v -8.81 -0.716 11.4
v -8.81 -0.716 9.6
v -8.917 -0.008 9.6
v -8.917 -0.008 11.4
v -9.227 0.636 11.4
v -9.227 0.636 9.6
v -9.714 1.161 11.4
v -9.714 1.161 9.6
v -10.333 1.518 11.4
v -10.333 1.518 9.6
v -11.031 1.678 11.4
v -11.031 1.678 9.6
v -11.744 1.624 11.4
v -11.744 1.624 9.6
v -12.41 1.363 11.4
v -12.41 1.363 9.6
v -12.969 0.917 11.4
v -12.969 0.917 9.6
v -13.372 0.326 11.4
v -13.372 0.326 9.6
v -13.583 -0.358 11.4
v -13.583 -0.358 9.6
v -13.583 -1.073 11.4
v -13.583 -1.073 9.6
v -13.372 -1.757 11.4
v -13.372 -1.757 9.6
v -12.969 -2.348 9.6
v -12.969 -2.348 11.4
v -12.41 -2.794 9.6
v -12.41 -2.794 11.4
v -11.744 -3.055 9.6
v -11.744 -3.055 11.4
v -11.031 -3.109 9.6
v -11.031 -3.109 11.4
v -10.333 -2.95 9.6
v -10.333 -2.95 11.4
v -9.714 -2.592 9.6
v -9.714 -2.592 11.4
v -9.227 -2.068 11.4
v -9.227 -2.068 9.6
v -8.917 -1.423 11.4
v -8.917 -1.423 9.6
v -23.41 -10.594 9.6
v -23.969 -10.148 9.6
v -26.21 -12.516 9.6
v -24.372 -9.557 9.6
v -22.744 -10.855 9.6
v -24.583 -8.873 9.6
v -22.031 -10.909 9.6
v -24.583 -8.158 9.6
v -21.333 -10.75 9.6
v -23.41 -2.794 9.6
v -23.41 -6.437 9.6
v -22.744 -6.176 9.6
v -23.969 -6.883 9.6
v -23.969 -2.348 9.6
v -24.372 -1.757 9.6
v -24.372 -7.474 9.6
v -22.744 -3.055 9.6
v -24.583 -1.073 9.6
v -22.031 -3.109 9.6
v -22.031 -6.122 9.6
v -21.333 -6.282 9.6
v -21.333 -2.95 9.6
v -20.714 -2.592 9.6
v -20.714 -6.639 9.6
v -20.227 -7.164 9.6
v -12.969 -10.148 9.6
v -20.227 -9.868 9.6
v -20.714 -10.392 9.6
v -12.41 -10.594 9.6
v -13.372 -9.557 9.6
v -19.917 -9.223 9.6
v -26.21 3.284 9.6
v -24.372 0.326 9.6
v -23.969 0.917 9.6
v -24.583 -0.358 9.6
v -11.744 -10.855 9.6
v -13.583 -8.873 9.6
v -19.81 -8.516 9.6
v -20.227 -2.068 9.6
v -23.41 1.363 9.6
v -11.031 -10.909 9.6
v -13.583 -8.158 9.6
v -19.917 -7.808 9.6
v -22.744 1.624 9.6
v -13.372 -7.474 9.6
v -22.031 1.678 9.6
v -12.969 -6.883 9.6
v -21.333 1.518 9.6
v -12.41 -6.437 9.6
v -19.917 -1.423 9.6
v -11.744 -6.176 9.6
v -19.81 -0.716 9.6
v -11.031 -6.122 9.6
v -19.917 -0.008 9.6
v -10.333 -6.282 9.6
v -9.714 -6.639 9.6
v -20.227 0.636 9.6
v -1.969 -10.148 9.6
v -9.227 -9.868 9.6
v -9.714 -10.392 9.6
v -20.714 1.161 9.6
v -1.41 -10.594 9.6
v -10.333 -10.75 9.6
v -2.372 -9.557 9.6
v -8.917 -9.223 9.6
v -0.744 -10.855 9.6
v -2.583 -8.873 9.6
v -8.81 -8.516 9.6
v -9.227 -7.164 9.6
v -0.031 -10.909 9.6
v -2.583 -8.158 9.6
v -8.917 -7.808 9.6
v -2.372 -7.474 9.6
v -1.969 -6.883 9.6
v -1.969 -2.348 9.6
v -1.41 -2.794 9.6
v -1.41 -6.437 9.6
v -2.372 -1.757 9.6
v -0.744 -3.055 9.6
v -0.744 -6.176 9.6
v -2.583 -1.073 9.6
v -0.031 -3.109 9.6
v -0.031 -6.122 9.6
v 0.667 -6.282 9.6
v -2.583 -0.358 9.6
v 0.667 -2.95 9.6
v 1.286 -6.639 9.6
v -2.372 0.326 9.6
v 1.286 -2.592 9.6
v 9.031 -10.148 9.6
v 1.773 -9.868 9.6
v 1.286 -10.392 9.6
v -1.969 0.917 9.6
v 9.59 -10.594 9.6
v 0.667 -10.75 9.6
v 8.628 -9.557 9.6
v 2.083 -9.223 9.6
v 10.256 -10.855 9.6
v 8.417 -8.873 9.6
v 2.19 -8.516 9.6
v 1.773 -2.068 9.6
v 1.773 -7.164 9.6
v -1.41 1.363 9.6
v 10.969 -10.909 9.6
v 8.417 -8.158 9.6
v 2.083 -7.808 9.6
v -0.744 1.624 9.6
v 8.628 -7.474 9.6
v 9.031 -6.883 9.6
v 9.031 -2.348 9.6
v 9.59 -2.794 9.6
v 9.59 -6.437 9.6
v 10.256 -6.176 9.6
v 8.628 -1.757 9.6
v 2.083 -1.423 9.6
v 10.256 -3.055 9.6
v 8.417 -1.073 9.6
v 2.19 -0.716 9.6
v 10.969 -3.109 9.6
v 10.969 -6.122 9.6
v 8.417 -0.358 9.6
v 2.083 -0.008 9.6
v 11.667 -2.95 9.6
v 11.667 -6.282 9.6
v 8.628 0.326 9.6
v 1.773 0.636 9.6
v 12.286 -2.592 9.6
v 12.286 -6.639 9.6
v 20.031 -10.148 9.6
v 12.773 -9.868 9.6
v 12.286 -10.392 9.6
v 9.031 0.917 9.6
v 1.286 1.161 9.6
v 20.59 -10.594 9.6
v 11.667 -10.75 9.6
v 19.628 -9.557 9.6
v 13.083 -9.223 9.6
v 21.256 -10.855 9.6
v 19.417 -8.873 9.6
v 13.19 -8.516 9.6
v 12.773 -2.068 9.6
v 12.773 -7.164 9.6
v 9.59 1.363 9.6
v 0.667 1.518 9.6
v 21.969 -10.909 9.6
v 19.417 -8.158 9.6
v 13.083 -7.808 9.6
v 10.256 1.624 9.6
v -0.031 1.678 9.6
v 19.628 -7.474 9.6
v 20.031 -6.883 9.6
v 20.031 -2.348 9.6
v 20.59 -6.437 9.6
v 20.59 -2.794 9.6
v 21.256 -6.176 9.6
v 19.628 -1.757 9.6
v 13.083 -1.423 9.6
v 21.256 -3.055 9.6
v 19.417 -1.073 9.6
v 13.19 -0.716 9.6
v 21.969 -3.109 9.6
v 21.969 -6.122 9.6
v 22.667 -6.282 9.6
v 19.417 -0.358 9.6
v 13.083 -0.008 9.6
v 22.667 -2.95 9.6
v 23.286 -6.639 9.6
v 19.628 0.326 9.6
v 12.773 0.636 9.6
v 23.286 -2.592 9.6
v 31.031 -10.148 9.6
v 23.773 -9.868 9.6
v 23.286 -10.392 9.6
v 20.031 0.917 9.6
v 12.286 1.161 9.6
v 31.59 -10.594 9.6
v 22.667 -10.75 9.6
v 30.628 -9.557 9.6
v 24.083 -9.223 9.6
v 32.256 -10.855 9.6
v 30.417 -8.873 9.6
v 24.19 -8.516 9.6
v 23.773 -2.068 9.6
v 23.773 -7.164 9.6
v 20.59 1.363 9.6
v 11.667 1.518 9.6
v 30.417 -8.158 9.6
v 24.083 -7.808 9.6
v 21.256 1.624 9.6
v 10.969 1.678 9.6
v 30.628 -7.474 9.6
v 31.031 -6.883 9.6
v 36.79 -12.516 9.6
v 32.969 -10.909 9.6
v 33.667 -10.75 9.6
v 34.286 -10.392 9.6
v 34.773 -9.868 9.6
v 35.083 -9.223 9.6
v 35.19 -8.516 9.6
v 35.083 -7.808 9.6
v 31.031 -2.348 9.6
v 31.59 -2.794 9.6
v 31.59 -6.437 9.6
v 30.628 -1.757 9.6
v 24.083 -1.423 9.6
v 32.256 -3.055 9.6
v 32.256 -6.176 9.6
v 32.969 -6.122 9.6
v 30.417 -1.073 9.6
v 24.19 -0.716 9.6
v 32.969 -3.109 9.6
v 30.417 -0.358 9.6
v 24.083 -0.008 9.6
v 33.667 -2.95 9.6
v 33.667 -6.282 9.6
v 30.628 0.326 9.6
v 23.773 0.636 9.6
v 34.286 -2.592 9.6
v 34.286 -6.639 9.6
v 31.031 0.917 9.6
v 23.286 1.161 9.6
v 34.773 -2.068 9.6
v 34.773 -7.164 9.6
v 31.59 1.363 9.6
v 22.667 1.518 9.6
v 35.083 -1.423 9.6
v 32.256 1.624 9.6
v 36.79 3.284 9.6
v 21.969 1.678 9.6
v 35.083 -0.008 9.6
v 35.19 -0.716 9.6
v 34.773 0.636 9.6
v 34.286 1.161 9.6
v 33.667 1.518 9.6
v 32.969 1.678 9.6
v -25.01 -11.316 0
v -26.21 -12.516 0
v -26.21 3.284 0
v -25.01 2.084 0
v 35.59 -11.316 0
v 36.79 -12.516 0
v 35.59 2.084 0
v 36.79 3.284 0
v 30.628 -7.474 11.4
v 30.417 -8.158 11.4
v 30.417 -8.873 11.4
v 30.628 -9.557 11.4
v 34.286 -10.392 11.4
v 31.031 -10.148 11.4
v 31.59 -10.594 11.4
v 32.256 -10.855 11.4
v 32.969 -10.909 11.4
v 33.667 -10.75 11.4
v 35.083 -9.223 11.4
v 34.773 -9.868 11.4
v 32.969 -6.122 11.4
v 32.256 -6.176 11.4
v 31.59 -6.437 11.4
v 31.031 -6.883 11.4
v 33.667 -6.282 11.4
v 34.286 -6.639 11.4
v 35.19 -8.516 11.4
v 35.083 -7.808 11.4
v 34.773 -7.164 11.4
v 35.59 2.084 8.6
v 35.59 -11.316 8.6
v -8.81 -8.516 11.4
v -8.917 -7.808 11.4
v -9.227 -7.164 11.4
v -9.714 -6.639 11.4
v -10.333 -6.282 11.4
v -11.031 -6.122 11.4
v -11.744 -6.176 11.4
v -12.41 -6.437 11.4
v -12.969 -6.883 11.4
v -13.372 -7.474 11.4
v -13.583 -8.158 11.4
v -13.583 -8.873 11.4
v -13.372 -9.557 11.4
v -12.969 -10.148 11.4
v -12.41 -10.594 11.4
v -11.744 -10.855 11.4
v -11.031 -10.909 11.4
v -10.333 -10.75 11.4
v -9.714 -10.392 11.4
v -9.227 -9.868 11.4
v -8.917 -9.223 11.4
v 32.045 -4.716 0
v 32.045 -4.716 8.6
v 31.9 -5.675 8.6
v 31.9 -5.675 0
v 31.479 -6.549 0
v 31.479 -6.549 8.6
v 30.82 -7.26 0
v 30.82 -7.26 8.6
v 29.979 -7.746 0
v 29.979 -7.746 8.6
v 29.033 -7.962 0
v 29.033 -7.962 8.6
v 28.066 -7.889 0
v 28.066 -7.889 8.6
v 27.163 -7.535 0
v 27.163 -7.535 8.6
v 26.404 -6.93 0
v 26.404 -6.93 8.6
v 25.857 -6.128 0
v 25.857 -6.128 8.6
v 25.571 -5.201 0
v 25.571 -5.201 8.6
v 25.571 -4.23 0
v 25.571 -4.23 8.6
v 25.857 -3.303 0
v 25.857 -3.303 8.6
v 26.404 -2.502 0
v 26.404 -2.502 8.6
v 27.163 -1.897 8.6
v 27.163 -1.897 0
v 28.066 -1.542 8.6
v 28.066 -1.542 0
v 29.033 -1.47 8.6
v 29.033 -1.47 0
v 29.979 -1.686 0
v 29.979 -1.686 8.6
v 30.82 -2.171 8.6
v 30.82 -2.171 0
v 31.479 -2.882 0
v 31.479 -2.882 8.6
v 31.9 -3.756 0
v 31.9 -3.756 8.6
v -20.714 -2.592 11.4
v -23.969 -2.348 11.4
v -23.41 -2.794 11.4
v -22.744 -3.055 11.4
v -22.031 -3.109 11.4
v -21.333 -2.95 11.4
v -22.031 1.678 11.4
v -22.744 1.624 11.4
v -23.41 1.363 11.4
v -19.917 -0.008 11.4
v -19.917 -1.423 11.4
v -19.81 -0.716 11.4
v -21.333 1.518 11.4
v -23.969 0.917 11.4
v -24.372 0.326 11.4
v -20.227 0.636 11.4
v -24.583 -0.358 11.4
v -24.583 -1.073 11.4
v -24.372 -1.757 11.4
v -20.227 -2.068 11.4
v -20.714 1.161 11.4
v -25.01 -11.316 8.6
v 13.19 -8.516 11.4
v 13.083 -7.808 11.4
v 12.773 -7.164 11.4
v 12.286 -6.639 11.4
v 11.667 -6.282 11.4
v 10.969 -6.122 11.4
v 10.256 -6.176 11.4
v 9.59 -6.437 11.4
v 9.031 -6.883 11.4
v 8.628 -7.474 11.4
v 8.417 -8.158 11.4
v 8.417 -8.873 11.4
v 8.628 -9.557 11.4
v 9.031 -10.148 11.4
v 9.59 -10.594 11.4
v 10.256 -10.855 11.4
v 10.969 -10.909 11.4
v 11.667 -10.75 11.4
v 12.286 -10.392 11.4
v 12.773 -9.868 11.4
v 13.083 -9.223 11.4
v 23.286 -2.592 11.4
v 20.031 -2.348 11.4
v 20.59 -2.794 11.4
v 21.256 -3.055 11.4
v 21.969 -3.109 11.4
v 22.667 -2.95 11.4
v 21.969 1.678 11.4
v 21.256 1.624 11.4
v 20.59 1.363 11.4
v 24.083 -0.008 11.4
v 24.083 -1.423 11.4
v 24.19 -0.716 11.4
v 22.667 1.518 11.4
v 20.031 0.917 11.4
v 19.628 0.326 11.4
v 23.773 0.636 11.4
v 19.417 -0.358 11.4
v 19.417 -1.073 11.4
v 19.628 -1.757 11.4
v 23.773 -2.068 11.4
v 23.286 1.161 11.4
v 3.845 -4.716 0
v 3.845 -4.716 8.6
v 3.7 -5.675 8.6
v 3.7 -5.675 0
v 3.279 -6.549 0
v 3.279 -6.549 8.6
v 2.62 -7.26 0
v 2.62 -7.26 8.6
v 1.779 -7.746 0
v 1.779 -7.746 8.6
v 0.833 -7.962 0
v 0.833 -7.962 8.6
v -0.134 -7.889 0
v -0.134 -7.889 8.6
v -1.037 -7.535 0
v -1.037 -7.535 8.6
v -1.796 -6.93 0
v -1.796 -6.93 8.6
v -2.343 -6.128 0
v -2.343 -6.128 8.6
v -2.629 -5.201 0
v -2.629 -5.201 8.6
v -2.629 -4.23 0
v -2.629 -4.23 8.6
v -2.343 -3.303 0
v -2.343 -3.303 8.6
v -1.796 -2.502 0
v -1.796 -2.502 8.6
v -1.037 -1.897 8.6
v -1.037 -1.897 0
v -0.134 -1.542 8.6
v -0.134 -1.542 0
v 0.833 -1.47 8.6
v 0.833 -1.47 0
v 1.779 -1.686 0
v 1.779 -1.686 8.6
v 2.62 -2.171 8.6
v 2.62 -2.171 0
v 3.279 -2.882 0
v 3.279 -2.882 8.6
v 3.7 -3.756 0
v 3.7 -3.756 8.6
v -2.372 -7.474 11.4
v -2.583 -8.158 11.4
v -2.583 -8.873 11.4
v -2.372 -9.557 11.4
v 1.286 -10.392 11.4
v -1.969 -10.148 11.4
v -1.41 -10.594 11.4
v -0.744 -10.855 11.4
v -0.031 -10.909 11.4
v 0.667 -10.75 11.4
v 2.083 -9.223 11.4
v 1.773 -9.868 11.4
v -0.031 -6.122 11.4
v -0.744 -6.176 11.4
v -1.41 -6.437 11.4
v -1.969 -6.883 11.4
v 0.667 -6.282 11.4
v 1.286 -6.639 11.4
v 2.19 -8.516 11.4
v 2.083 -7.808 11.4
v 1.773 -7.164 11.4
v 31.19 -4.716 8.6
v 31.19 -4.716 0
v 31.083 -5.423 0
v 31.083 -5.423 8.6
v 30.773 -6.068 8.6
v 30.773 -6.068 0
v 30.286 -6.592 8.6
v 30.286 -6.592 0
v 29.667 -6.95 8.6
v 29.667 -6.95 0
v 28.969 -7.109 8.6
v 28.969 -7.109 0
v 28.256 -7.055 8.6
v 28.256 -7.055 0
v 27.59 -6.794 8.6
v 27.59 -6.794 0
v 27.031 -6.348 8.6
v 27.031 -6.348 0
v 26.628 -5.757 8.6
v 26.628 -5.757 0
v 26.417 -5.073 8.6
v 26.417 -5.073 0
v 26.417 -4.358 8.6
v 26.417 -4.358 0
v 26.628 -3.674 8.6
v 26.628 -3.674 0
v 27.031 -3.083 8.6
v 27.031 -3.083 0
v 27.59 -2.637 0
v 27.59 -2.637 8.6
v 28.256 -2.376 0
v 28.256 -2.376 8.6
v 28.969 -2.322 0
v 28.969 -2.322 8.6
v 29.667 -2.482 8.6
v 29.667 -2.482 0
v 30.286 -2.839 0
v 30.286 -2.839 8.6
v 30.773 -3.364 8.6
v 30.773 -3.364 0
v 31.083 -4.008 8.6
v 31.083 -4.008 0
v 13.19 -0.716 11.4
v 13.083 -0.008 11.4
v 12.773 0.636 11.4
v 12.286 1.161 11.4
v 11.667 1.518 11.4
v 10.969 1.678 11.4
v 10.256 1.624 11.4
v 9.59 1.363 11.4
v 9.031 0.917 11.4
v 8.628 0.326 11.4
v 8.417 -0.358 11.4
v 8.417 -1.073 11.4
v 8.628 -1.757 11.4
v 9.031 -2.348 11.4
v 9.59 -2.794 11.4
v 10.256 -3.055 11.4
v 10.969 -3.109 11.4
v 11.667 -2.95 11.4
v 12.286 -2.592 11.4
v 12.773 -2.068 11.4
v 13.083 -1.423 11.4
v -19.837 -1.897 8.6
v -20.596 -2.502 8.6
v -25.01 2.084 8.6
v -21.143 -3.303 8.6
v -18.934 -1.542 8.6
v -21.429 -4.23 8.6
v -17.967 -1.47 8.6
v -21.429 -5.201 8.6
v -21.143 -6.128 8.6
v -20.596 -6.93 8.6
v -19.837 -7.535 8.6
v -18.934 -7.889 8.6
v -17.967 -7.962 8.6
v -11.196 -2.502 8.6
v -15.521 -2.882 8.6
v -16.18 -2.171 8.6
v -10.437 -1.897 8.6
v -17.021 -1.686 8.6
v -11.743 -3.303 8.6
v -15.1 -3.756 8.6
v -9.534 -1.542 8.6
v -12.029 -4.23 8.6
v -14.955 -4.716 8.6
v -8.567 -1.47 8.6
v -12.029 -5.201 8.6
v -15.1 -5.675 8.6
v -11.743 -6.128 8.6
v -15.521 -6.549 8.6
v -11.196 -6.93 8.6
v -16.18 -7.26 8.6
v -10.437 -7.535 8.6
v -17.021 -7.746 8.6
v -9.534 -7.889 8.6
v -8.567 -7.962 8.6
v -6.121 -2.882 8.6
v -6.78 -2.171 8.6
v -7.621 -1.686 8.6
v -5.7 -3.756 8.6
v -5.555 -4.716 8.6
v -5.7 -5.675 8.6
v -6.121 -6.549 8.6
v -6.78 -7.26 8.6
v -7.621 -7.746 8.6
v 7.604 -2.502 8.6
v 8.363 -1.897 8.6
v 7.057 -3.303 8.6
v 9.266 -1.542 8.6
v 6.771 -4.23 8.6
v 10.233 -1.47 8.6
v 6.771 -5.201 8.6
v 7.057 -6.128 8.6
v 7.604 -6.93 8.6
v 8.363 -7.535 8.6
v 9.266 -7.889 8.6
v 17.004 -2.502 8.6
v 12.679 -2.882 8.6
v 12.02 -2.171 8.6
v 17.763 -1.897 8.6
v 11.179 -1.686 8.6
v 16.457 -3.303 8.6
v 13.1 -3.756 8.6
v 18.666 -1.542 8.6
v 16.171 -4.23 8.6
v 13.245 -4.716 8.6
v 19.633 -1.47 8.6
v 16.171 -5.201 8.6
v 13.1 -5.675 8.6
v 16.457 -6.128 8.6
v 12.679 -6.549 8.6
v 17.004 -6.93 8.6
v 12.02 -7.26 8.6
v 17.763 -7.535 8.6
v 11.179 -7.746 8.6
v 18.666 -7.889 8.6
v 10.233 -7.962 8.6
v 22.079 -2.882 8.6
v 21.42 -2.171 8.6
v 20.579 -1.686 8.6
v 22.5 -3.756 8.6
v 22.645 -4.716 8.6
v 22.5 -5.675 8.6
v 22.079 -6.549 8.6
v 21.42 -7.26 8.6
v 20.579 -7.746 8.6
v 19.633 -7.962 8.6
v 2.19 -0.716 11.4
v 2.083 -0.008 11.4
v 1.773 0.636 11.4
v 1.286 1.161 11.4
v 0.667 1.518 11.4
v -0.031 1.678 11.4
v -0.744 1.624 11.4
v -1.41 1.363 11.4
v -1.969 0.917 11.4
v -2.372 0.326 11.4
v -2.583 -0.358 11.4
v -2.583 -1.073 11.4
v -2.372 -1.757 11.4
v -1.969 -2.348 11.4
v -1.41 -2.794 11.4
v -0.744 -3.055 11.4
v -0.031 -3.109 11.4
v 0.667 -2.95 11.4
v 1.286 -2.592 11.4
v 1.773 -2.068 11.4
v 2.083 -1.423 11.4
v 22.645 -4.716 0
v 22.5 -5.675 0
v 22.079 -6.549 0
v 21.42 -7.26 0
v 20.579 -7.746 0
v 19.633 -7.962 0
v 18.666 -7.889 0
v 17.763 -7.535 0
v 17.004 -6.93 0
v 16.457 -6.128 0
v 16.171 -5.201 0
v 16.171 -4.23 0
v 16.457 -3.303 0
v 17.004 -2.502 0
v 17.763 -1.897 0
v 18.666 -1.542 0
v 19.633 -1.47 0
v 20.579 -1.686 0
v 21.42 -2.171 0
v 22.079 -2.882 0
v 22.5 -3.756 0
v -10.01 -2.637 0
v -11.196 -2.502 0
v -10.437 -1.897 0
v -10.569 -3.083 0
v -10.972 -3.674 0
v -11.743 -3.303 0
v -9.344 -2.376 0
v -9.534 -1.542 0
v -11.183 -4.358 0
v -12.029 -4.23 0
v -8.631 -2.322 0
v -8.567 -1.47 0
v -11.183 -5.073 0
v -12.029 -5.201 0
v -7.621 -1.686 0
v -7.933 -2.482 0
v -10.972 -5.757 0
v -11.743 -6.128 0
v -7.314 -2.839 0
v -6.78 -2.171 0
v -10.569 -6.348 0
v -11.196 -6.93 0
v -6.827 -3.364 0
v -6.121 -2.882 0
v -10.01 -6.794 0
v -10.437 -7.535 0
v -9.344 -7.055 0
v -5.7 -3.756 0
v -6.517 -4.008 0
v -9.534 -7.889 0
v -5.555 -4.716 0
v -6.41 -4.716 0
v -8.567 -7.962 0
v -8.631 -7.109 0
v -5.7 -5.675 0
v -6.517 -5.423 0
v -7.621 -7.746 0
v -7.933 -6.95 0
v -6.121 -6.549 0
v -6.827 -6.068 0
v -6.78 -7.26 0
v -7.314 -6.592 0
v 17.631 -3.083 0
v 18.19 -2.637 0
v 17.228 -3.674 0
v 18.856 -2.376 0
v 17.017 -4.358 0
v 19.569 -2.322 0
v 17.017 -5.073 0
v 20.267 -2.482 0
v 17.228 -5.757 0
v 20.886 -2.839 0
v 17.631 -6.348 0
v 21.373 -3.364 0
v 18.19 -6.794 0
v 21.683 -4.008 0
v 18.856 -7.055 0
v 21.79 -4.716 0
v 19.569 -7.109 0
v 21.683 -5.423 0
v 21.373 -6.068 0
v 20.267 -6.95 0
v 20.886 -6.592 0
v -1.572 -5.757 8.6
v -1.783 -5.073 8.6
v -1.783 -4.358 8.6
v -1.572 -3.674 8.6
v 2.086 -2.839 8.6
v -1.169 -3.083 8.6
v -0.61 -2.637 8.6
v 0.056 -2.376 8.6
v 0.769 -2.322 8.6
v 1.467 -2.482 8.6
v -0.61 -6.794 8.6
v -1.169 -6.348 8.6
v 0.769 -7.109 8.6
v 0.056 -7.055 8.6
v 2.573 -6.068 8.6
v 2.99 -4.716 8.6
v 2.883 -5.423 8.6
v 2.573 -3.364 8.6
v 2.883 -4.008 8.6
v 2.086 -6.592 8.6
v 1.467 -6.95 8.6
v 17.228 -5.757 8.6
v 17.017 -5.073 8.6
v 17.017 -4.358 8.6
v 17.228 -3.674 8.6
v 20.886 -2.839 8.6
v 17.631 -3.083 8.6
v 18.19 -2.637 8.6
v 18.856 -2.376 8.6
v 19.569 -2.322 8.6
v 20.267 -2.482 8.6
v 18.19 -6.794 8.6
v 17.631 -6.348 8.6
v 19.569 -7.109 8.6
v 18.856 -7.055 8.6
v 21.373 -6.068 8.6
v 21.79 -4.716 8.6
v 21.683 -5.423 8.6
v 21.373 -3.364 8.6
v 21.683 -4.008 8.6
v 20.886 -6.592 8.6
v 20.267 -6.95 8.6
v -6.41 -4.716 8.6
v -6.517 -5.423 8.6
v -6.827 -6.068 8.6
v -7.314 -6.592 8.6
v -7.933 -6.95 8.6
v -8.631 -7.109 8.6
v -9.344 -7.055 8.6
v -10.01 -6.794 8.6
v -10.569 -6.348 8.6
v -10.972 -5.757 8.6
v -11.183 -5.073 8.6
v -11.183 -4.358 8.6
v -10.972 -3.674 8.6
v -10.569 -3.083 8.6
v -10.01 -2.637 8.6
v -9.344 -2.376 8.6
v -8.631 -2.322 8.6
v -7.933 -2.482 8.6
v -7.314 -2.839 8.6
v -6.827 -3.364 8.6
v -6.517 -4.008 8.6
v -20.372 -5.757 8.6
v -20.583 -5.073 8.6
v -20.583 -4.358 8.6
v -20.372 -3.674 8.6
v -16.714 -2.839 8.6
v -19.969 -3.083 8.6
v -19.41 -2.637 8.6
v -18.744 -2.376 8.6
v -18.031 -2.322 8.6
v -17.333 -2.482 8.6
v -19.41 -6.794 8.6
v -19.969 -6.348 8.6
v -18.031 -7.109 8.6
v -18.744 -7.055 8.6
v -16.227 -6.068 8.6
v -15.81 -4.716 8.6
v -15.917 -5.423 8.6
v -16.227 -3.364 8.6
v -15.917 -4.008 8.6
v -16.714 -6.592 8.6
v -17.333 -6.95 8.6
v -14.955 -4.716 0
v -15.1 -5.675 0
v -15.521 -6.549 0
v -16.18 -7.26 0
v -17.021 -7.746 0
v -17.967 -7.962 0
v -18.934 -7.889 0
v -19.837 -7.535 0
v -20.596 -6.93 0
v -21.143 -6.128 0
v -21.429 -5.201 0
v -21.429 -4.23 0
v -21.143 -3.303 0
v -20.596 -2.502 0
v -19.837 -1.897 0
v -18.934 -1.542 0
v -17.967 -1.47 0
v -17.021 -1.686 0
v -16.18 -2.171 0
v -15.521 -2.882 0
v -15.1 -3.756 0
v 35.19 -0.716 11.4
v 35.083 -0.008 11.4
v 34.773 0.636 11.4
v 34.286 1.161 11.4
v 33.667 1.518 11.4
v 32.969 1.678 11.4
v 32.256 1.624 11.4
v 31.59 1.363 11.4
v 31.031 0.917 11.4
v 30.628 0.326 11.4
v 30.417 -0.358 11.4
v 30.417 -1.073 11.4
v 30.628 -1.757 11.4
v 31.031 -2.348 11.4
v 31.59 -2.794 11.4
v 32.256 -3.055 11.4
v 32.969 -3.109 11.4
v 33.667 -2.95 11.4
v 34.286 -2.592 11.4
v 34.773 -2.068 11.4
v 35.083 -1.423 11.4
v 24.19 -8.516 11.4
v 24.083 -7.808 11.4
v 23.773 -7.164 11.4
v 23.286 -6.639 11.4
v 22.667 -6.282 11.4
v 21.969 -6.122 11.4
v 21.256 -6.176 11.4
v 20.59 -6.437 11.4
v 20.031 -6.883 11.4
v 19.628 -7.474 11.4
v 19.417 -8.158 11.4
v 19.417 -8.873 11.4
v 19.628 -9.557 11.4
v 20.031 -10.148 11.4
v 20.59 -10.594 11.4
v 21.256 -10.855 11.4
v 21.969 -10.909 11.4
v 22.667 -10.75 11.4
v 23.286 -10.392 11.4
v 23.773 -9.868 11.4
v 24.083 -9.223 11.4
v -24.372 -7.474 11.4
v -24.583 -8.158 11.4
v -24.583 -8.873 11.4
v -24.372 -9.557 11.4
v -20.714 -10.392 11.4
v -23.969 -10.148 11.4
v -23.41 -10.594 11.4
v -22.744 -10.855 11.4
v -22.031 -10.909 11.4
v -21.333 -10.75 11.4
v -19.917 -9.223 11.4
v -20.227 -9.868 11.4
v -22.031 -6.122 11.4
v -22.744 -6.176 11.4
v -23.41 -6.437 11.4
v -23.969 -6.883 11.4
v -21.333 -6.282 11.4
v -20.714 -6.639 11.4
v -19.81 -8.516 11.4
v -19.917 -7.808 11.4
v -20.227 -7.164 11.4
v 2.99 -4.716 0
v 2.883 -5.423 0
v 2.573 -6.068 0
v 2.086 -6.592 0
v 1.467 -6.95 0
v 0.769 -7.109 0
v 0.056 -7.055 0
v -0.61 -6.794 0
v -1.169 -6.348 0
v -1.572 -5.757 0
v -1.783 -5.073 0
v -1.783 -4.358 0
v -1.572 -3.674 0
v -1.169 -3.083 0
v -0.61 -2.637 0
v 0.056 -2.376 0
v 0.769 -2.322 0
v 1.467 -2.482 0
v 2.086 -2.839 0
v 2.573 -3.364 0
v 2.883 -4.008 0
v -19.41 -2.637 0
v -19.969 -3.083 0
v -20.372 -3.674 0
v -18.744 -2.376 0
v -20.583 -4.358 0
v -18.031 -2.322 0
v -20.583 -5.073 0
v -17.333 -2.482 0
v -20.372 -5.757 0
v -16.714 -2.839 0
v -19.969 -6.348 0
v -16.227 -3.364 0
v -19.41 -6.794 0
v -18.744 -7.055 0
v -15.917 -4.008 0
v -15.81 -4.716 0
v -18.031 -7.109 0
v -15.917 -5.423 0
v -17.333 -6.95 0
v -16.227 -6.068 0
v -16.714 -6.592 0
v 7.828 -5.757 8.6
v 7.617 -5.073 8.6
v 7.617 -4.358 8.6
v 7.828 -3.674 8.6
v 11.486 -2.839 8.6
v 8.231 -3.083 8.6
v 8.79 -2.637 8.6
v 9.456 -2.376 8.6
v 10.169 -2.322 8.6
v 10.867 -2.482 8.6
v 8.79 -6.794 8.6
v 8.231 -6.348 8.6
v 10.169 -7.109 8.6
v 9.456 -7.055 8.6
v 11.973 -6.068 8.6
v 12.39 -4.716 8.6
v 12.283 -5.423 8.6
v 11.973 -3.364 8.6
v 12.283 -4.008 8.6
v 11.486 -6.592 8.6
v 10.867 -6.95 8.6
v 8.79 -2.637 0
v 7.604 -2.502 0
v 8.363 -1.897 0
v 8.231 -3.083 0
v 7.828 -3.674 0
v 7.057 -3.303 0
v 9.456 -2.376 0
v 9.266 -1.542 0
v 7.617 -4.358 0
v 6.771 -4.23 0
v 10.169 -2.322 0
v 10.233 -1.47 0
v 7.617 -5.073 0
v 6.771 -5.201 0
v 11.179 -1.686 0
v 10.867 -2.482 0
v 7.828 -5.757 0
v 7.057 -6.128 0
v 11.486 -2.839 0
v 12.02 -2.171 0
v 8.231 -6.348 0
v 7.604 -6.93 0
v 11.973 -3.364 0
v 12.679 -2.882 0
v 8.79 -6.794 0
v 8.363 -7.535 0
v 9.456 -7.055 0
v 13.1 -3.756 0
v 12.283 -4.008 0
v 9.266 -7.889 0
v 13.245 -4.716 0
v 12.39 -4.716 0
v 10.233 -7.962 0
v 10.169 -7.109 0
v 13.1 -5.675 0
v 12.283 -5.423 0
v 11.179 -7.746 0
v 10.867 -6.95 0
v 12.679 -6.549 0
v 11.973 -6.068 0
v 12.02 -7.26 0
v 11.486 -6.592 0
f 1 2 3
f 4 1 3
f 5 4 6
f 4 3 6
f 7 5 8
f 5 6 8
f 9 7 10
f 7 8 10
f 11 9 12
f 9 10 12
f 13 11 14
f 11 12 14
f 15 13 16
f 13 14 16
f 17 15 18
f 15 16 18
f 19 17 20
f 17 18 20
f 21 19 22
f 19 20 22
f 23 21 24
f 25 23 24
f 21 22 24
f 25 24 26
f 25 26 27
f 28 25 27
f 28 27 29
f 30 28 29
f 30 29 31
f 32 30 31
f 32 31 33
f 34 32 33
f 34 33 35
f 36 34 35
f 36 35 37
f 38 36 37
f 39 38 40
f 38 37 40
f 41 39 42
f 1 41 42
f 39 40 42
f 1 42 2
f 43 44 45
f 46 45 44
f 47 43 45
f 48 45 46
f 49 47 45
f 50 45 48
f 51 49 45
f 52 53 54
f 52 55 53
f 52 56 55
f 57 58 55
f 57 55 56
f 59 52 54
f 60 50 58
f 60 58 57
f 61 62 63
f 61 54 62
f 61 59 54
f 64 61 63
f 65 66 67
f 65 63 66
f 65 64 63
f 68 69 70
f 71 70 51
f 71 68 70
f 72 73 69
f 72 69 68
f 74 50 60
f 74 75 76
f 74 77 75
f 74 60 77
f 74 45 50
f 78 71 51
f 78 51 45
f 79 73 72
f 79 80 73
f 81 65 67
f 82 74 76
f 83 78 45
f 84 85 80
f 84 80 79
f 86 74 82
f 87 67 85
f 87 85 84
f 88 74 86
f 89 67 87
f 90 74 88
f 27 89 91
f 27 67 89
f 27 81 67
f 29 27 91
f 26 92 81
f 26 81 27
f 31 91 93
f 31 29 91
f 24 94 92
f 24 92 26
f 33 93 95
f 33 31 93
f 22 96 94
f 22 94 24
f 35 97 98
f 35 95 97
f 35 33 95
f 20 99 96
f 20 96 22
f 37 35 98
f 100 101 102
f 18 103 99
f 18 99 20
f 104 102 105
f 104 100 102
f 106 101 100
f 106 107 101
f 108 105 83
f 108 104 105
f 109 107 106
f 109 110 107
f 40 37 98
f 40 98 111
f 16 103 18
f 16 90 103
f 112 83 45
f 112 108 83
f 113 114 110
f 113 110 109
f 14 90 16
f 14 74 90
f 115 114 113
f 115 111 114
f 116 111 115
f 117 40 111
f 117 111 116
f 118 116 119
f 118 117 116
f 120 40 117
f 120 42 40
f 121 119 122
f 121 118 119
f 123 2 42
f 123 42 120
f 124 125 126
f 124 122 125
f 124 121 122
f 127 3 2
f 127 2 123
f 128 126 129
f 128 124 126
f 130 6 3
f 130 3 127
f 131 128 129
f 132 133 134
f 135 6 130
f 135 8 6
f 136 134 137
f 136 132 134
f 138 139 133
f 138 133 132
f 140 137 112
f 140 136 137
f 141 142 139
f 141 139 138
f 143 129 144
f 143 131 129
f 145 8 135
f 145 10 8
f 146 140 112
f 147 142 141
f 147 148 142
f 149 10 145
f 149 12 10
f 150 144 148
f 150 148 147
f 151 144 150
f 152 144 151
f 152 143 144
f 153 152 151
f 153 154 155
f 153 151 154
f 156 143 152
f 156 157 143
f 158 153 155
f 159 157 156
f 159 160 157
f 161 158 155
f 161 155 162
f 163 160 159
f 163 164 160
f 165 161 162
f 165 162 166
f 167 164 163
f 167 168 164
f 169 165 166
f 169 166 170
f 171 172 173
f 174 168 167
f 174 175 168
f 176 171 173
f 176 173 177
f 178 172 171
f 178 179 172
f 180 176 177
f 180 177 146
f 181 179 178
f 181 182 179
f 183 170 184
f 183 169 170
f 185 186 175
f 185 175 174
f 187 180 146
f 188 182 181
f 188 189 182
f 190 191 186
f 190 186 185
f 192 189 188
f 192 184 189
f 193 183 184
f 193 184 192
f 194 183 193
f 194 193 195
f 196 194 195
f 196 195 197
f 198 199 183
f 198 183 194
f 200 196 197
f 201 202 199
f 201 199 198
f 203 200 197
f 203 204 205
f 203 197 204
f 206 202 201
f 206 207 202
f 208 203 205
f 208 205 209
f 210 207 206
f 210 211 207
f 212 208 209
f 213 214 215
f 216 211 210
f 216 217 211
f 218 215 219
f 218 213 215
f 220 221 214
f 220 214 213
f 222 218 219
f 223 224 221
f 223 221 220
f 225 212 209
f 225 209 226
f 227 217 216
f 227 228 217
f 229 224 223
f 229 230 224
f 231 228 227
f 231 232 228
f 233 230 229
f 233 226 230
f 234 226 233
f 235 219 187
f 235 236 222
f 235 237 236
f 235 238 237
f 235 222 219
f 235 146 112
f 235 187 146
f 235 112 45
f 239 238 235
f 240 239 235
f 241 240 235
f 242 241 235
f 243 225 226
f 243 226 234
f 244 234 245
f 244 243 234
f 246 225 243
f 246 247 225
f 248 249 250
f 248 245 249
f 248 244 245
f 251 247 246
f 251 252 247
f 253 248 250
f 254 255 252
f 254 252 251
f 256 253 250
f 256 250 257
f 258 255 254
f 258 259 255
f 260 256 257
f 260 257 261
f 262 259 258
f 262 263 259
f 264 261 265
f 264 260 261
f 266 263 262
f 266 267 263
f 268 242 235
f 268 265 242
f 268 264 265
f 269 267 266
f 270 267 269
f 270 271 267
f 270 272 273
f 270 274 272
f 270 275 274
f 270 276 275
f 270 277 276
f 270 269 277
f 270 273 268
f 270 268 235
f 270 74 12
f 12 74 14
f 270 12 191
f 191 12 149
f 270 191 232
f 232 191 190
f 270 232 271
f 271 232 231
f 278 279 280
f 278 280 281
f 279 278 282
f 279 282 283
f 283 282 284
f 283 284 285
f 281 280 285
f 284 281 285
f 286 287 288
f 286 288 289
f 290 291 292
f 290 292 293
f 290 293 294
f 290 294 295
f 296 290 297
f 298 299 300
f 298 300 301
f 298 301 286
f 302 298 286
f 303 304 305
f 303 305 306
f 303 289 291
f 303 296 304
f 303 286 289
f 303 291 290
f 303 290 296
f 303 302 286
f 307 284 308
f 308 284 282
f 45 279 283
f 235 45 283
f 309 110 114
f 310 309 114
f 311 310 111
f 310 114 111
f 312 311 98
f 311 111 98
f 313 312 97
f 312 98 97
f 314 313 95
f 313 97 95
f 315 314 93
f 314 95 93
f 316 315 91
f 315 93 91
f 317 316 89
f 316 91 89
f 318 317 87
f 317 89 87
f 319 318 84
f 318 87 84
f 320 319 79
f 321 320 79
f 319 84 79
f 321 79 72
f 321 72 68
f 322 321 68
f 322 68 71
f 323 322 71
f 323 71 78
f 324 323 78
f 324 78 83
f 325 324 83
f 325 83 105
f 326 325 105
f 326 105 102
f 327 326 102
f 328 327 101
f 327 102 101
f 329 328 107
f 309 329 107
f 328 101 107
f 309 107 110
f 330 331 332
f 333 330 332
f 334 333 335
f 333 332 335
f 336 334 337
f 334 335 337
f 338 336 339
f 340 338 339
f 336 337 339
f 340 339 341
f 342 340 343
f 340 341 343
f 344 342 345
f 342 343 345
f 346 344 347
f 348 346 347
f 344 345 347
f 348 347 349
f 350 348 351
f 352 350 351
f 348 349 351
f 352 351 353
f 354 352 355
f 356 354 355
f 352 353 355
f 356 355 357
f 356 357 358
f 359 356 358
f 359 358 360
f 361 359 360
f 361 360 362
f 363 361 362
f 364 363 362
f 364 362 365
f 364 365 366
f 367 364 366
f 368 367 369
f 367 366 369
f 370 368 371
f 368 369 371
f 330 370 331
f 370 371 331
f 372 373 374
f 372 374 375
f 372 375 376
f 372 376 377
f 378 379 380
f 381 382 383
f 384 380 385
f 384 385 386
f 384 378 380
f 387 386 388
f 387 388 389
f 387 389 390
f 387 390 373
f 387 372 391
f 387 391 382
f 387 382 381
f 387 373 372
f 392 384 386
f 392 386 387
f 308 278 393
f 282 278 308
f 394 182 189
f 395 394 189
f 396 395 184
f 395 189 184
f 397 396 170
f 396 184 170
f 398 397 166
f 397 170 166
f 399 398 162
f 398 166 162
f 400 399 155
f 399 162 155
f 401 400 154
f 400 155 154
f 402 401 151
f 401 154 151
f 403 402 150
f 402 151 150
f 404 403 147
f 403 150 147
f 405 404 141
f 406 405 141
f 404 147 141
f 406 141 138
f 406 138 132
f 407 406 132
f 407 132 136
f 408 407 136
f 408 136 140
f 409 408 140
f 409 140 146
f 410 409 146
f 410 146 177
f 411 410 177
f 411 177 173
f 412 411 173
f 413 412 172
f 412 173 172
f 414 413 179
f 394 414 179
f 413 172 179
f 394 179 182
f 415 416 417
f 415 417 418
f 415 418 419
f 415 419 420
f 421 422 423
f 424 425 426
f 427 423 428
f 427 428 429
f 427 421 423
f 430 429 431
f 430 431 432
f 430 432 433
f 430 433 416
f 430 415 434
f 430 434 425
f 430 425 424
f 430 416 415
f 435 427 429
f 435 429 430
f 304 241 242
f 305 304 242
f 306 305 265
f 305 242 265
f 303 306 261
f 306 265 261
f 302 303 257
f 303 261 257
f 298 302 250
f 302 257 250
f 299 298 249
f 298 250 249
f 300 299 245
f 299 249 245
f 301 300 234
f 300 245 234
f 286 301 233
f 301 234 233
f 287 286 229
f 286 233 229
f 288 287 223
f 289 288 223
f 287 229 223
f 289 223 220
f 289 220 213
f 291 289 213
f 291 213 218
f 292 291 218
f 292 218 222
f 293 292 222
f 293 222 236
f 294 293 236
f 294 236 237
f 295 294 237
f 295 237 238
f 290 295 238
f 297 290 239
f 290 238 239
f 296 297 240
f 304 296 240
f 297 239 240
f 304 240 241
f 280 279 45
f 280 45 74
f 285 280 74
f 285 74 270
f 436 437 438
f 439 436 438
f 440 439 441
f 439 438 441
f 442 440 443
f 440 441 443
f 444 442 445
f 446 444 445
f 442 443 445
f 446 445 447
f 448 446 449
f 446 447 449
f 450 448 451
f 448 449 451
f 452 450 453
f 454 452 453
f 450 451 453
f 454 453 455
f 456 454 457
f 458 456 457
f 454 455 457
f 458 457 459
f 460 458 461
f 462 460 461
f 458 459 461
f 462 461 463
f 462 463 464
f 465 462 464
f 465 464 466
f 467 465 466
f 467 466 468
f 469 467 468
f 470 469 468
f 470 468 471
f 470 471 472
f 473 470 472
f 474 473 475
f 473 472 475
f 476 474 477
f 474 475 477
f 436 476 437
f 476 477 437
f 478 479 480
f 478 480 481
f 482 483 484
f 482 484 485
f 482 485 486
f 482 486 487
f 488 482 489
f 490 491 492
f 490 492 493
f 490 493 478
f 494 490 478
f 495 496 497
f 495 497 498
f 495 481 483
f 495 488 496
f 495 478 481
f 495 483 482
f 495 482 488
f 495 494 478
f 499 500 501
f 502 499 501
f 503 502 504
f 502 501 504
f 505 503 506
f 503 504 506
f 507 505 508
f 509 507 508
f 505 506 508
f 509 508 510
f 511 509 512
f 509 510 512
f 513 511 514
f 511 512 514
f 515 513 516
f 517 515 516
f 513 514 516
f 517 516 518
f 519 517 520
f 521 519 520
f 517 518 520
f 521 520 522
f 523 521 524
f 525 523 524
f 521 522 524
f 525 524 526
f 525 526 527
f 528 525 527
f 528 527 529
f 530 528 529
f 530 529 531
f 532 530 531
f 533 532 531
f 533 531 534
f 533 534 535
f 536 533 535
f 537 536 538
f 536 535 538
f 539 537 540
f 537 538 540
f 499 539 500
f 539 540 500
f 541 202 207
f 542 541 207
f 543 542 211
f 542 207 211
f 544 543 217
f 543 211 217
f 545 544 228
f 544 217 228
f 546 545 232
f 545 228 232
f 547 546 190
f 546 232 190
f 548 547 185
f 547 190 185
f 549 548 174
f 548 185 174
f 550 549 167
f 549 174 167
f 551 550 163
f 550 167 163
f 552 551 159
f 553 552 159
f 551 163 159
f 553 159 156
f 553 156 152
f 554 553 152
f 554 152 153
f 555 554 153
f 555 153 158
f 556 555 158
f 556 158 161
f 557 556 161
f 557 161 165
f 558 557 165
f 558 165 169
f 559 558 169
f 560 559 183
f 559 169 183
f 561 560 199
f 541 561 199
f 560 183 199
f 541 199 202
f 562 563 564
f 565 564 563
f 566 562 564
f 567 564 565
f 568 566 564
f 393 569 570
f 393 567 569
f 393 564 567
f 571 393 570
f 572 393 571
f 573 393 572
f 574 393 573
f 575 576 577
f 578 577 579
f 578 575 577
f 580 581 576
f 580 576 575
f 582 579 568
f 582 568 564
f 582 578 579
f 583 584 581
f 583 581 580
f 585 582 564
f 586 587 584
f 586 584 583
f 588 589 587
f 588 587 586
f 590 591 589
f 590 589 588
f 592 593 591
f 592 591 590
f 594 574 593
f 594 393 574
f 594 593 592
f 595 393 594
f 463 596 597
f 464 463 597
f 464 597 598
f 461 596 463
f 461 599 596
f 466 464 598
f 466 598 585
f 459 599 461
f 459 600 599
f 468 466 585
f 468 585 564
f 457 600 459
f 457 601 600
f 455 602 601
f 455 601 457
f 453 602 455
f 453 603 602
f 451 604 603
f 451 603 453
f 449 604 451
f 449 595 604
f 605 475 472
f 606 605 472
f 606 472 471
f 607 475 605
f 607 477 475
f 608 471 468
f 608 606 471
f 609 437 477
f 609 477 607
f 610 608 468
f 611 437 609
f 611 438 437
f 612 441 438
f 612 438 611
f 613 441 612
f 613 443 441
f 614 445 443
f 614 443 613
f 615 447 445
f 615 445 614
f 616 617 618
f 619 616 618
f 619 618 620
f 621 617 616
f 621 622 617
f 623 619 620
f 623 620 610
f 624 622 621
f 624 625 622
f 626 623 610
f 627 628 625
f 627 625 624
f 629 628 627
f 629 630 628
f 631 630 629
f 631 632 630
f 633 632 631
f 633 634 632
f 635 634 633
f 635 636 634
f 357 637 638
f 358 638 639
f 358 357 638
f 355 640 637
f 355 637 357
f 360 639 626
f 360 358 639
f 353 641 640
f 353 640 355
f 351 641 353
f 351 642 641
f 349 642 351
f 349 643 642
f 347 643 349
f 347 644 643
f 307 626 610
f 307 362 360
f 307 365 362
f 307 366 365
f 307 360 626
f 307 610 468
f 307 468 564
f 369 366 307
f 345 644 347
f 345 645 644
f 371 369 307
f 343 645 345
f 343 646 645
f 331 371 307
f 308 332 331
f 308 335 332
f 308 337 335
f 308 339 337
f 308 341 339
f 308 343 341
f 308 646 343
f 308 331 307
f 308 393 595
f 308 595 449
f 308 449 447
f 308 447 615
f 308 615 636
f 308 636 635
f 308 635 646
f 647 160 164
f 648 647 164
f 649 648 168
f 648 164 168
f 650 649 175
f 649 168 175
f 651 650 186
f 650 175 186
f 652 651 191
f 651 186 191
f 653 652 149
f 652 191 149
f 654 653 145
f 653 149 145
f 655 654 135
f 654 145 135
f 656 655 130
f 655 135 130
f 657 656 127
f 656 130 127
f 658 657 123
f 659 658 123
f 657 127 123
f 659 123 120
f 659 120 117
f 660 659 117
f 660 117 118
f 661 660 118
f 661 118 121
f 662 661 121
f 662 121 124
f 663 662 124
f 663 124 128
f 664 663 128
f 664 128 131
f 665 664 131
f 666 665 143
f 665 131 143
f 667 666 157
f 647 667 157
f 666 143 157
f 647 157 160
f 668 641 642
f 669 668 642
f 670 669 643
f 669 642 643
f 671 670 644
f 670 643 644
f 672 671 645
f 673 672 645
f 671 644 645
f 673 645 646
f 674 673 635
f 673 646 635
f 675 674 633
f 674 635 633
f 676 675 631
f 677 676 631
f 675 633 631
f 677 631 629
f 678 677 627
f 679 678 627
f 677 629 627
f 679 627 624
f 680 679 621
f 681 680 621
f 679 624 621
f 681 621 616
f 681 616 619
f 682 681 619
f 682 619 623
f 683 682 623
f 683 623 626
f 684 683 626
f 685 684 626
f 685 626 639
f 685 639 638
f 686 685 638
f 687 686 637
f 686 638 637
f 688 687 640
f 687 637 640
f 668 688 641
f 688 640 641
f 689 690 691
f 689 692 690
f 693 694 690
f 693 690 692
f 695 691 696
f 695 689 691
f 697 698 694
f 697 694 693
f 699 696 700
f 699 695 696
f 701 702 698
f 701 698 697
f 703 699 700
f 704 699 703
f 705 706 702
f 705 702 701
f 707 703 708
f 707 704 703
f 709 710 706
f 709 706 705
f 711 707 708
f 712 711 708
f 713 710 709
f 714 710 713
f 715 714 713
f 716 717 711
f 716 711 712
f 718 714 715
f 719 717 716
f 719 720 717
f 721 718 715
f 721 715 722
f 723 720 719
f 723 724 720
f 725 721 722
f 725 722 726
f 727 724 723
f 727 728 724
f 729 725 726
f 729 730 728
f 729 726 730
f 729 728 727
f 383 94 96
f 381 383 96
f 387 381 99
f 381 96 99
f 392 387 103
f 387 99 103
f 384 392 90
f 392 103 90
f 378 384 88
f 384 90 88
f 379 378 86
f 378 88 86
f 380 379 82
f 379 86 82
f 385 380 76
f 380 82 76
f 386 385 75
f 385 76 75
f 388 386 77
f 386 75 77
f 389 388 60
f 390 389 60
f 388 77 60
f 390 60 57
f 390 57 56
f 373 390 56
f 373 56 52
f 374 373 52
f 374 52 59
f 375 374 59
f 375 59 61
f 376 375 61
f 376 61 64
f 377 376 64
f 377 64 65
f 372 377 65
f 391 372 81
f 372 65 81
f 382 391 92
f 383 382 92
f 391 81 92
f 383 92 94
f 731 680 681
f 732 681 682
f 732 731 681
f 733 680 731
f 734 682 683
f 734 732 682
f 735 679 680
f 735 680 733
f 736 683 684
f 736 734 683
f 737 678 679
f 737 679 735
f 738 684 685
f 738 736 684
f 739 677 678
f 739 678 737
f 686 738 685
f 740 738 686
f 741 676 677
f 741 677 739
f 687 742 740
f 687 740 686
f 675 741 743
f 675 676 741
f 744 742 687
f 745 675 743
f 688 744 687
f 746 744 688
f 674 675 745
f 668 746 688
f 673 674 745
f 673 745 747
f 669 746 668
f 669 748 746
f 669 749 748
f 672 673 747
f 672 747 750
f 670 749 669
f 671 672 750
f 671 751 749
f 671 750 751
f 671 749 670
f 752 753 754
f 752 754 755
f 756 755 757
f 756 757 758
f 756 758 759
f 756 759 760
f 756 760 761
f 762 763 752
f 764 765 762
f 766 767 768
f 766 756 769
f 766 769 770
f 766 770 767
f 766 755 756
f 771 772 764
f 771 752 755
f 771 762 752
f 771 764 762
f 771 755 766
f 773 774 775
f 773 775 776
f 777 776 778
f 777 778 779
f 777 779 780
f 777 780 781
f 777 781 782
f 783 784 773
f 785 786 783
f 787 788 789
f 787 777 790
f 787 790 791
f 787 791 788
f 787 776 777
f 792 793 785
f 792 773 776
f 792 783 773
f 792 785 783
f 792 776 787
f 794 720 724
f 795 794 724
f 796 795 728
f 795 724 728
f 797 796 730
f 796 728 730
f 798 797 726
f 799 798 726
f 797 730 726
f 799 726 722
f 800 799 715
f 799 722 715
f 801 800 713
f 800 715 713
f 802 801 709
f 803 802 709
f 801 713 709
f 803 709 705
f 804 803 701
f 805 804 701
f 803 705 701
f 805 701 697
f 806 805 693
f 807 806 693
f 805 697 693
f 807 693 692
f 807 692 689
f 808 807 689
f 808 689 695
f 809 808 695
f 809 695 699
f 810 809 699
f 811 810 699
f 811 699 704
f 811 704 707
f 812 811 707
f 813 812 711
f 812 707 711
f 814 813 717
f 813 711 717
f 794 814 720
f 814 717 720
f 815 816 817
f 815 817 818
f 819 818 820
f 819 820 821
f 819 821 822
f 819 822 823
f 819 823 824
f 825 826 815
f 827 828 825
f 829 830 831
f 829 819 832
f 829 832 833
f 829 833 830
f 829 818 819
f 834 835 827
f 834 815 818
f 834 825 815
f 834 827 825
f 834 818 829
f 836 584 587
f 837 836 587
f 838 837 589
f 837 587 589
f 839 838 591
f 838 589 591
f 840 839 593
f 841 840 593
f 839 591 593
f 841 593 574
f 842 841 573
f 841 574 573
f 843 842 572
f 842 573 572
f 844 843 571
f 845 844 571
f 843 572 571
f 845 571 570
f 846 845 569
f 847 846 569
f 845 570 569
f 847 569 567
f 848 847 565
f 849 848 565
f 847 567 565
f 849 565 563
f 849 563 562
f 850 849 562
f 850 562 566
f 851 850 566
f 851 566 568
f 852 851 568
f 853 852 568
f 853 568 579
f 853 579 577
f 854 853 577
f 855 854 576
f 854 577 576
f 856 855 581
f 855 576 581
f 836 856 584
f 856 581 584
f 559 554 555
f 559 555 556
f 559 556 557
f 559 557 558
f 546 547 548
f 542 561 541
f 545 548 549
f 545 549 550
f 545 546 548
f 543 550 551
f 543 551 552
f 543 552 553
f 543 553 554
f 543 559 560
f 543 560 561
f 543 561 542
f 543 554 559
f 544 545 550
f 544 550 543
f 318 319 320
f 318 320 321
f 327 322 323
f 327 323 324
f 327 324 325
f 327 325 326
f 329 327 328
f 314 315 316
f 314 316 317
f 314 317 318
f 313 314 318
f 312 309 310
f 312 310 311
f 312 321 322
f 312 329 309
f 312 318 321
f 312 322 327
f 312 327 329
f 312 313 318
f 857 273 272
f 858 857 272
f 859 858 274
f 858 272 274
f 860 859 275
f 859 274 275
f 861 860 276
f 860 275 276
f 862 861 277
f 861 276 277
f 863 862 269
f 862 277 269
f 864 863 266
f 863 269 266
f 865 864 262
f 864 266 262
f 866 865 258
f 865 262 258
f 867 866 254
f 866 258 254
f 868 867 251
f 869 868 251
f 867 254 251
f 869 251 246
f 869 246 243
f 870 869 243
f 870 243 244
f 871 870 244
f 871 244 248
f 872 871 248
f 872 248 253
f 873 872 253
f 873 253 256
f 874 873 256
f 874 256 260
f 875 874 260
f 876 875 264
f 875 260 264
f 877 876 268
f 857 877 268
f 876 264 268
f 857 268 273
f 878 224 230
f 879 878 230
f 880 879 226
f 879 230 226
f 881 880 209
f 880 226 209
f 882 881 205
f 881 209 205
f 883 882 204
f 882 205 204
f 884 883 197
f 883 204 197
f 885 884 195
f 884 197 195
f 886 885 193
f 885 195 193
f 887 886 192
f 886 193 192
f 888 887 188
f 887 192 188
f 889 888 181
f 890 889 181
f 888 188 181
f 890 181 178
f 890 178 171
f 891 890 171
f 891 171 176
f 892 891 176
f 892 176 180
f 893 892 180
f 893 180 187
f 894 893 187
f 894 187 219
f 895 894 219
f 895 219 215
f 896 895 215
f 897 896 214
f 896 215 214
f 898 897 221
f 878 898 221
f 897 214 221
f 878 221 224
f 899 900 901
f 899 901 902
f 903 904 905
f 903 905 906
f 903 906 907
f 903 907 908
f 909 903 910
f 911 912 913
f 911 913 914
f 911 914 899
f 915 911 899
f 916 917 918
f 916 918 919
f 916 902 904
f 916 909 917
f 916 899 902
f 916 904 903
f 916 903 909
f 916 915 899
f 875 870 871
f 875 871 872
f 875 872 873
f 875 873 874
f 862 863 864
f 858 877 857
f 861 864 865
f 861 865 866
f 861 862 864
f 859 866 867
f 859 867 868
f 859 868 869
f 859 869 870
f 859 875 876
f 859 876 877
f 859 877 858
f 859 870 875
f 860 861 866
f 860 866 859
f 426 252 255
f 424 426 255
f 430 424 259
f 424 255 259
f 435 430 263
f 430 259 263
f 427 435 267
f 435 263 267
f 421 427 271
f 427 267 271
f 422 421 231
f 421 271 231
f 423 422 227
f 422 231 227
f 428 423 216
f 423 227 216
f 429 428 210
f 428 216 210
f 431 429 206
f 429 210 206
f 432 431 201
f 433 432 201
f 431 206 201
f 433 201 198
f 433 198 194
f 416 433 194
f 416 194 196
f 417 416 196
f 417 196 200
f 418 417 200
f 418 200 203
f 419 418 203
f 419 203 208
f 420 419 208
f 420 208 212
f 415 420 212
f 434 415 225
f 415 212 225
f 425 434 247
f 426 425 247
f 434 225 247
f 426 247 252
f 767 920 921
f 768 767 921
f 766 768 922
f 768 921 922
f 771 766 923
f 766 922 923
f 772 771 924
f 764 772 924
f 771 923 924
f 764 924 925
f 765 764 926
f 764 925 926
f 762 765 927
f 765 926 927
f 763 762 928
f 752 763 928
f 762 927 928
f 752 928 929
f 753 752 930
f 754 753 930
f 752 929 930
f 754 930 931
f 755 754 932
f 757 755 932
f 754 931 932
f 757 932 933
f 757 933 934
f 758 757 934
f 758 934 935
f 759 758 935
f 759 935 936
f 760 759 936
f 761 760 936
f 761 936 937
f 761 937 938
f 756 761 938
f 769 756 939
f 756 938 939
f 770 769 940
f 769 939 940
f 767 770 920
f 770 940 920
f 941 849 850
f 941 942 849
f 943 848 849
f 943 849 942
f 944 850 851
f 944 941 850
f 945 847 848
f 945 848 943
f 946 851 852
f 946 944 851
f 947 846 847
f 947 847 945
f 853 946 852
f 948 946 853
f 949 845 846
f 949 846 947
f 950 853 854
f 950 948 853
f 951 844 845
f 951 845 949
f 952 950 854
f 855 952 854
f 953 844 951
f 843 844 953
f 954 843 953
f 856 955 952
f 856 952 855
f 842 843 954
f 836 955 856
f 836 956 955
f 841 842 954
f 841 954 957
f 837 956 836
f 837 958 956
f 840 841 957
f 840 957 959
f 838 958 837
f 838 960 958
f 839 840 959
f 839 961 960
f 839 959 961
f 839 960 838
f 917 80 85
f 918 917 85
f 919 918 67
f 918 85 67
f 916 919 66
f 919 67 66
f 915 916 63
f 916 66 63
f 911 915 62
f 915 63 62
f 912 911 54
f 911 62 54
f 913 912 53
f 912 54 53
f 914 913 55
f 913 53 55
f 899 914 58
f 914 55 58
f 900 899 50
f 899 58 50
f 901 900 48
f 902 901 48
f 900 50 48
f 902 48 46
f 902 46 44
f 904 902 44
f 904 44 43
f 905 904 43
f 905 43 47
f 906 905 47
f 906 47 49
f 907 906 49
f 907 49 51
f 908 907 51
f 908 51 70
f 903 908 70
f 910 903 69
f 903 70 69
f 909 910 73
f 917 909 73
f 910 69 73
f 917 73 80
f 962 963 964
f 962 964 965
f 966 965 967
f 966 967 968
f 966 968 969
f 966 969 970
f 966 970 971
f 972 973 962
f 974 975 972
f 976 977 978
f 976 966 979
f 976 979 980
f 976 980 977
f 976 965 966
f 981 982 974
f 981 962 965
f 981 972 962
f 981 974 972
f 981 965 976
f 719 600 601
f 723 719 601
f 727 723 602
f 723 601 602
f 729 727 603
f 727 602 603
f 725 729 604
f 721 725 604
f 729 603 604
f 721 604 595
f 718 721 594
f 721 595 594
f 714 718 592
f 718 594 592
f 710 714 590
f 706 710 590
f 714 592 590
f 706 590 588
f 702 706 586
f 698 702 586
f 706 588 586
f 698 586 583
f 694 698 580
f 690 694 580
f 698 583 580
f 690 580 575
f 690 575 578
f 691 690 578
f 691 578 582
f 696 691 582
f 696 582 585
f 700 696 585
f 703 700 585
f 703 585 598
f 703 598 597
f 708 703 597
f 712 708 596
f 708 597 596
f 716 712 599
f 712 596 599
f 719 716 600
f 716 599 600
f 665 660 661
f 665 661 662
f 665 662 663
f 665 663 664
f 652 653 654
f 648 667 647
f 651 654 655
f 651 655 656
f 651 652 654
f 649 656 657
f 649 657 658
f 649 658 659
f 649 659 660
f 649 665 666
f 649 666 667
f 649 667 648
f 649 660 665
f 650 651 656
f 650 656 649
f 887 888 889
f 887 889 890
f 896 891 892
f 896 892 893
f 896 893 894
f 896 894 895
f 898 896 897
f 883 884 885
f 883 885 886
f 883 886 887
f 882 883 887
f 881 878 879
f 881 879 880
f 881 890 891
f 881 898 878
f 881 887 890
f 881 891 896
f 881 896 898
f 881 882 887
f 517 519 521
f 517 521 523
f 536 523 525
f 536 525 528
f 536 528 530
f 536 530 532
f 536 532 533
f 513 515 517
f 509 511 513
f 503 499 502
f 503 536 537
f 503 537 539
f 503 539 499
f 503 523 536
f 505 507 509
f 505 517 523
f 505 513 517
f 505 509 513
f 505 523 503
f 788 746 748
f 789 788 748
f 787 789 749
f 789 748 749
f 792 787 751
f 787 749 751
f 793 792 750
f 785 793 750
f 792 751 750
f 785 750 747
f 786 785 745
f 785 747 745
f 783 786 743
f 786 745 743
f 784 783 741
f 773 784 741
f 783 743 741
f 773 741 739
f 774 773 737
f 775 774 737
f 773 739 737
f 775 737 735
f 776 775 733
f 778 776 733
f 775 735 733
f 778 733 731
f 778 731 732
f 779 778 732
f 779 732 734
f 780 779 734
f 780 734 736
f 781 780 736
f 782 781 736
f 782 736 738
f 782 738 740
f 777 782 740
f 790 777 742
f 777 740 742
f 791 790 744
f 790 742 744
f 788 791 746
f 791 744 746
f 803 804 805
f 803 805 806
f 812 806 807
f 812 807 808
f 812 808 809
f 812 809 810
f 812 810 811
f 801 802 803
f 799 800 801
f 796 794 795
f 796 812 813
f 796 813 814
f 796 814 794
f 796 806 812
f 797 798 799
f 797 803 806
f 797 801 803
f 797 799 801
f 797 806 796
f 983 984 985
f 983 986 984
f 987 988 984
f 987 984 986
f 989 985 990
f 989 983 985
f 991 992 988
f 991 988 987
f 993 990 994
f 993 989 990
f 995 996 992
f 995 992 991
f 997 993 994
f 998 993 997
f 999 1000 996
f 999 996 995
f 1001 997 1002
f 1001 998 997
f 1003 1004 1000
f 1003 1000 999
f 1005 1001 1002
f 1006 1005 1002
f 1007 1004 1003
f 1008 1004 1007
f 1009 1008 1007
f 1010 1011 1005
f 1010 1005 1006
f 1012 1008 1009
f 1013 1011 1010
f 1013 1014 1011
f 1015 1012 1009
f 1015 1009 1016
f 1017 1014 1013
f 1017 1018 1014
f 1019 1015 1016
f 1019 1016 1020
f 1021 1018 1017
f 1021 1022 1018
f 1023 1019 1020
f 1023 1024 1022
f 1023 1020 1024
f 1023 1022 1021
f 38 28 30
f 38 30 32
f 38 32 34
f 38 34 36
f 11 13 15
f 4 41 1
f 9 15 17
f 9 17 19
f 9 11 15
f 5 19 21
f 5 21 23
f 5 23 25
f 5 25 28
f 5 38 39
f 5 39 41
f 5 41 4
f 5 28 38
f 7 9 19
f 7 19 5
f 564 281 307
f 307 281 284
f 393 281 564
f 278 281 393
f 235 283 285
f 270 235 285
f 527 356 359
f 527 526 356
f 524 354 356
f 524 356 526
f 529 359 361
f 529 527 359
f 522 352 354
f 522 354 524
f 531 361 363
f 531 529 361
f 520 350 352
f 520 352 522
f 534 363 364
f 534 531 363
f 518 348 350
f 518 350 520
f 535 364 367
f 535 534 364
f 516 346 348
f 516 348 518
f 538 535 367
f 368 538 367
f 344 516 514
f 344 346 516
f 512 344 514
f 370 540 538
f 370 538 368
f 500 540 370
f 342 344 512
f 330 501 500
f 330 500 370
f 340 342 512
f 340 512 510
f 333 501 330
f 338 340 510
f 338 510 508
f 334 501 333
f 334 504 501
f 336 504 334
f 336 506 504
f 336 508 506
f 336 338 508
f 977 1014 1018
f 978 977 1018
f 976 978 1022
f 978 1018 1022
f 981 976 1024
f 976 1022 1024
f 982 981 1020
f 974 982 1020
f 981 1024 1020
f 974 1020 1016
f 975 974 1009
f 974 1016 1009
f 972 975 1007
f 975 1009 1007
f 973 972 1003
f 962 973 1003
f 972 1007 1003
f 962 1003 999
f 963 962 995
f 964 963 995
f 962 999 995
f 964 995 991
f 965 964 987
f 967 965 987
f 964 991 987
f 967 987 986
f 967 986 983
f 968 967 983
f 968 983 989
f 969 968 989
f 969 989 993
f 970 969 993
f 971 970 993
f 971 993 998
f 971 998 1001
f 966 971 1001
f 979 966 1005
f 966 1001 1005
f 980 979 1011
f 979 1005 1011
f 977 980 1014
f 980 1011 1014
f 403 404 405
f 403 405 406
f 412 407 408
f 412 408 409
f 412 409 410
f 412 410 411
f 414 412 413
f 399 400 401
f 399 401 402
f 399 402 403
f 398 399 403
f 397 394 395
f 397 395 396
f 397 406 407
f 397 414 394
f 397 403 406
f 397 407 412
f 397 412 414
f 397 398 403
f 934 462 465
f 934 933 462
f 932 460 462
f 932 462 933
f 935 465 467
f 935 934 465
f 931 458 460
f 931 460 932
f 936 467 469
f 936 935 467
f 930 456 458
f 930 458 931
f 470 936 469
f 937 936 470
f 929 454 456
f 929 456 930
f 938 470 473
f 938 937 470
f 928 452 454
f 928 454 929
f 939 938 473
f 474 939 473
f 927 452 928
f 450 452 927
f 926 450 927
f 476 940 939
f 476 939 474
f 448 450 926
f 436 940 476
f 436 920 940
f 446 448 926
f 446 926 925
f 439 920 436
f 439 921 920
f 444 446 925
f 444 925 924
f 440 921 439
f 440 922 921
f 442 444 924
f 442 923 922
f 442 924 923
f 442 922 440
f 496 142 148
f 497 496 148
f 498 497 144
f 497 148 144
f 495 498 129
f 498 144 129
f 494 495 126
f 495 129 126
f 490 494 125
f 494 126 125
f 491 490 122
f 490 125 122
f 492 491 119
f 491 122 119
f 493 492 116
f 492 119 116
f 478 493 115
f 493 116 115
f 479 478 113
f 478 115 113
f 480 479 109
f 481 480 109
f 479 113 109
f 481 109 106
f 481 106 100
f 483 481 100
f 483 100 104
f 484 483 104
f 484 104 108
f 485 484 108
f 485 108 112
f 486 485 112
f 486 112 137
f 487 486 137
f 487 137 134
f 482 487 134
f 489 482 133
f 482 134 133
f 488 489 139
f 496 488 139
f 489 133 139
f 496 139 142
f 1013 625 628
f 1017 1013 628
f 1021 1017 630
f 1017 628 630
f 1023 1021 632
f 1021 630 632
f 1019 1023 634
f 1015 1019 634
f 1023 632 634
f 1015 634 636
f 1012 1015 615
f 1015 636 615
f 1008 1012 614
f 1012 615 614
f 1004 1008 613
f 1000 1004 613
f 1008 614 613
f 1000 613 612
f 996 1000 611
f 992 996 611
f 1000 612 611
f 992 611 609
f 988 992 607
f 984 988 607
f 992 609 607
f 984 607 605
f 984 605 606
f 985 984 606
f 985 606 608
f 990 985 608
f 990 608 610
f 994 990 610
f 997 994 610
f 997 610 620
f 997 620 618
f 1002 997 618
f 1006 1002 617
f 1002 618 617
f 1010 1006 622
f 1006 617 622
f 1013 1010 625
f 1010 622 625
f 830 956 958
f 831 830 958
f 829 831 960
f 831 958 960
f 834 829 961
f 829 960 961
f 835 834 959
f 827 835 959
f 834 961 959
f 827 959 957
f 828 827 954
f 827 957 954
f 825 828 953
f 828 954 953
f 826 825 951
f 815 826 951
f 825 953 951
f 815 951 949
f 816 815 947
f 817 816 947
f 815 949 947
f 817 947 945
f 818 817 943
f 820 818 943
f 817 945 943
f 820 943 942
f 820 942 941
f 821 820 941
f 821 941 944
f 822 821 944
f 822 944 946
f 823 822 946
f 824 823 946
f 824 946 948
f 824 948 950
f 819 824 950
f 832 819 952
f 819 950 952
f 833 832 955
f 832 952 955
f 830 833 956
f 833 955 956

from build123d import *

# Parameters (mm, degrees)
SKETCH_W               = 63
SKETCH_H               = 15.8
PAD_DEPTH              = 9.6
SKETCH001_W            = 60.6
SKETCH001_H            = 13.4
POCKET_DEPTH           = 8.6
SKETCH002_R            = 2.4
PAD001_DEPTH           = 1.8
LINEARPATTERN_COUNT    = 6
LINEARPATTERN_PITCH    = 11
SKETCH003_R            = 3.255
PAD002_DEPTH           = 8.6
LINEARPATTERN001_COUNT = 6
LINEARPATTERN001_PITCH = 9.4
SKETCH004_R            = 2.4
POCKET001_DEPTH        = 8.6
LINEARPATTERN002_COUNT = 6
LINEARPATTERN002_PITCH = 9.4


with BuildPart() as part:
    # Sketch → Pad (new body)
    with BuildSketch(Plane.XY):
        with Locations((5.290092, -4.615627)):
            Rectangle(SKETCH_W, SKETCH_H)
    extrude(amount=PAD_DEPTH)

    # Sketch001 → Pocket (cut)
    with BuildSketch(Plane(origin=(0, 0, 0), x_dir=(1, 0, 0), z_dir=(0, 0, -1))):
        with Locations((5.290092, 4.615627)):
            Rectangle(SKETCH001_W, SKETCH001_H)
    extrude(amount=-POCKET_DEPTH, mode=Mode.SUBTRACT)

    # Sketch002 → Pad001 (new body)
    with BuildSketch(Plane.XY.offset(9.6)):
        with Locations((-22.209908, -0.715627)):
            Circle(SKETCH002_R)
        with Locations((-22.209908, -8.515627)):
            Circle(SKETCH002_R)
    pad001 = extrude(amount=PAD001_DEPTH)

    # LinearPattern: Pad001 ×6
    with Locations(*[(i * LINEARPATTERN_PITCH, 0, 0) for i in range(1, LINEARPATTERN_COUNT)]):
        add(pad001)

    # Sketch003 → Pad002 (new body)
    with BuildSketch(Plane(origin=(0, 0, 8.6), x_dir=(1, 0, 0), z_dir=(0, 0, -1))):
        with Locations((-18.209908, 4.715627)):
            Circle(SKETCH003_R)
    pad002 = extrude(amount=PAD002_DEPTH)

    # LinearPattern001: Pad002 ×6
    with Locations(*[(i * LINEARPATTERN001_PITCH, 0, 0) for i in range(1, LINEARPATTERN001_COUNT)]):
        add(pad002)

    # Sketch004 → Pocket001 (cut)
    with BuildSketch(Plane(origin=(0, 0, 0), x_dir=(1, 0, 0), z_dir=(0, 0, -1))):
        with Locations((-18.209908, 4.715627)):
            Circle(SKETCH004_R)
    pocket001 = extrude(amount=-POCKET001_DEPTH, mode=Mode.SUBTRACT)

    # LinearPattern002: Pocket001 ×6
    with Locations(*[(i * LINEARPATTERN002_PITCH, 0, 0) for i in range(1, LINEARPATTERN002_COUNT)]):
        add(pocket001, mode=Mode.SUBTRACT)


solid = part.part
